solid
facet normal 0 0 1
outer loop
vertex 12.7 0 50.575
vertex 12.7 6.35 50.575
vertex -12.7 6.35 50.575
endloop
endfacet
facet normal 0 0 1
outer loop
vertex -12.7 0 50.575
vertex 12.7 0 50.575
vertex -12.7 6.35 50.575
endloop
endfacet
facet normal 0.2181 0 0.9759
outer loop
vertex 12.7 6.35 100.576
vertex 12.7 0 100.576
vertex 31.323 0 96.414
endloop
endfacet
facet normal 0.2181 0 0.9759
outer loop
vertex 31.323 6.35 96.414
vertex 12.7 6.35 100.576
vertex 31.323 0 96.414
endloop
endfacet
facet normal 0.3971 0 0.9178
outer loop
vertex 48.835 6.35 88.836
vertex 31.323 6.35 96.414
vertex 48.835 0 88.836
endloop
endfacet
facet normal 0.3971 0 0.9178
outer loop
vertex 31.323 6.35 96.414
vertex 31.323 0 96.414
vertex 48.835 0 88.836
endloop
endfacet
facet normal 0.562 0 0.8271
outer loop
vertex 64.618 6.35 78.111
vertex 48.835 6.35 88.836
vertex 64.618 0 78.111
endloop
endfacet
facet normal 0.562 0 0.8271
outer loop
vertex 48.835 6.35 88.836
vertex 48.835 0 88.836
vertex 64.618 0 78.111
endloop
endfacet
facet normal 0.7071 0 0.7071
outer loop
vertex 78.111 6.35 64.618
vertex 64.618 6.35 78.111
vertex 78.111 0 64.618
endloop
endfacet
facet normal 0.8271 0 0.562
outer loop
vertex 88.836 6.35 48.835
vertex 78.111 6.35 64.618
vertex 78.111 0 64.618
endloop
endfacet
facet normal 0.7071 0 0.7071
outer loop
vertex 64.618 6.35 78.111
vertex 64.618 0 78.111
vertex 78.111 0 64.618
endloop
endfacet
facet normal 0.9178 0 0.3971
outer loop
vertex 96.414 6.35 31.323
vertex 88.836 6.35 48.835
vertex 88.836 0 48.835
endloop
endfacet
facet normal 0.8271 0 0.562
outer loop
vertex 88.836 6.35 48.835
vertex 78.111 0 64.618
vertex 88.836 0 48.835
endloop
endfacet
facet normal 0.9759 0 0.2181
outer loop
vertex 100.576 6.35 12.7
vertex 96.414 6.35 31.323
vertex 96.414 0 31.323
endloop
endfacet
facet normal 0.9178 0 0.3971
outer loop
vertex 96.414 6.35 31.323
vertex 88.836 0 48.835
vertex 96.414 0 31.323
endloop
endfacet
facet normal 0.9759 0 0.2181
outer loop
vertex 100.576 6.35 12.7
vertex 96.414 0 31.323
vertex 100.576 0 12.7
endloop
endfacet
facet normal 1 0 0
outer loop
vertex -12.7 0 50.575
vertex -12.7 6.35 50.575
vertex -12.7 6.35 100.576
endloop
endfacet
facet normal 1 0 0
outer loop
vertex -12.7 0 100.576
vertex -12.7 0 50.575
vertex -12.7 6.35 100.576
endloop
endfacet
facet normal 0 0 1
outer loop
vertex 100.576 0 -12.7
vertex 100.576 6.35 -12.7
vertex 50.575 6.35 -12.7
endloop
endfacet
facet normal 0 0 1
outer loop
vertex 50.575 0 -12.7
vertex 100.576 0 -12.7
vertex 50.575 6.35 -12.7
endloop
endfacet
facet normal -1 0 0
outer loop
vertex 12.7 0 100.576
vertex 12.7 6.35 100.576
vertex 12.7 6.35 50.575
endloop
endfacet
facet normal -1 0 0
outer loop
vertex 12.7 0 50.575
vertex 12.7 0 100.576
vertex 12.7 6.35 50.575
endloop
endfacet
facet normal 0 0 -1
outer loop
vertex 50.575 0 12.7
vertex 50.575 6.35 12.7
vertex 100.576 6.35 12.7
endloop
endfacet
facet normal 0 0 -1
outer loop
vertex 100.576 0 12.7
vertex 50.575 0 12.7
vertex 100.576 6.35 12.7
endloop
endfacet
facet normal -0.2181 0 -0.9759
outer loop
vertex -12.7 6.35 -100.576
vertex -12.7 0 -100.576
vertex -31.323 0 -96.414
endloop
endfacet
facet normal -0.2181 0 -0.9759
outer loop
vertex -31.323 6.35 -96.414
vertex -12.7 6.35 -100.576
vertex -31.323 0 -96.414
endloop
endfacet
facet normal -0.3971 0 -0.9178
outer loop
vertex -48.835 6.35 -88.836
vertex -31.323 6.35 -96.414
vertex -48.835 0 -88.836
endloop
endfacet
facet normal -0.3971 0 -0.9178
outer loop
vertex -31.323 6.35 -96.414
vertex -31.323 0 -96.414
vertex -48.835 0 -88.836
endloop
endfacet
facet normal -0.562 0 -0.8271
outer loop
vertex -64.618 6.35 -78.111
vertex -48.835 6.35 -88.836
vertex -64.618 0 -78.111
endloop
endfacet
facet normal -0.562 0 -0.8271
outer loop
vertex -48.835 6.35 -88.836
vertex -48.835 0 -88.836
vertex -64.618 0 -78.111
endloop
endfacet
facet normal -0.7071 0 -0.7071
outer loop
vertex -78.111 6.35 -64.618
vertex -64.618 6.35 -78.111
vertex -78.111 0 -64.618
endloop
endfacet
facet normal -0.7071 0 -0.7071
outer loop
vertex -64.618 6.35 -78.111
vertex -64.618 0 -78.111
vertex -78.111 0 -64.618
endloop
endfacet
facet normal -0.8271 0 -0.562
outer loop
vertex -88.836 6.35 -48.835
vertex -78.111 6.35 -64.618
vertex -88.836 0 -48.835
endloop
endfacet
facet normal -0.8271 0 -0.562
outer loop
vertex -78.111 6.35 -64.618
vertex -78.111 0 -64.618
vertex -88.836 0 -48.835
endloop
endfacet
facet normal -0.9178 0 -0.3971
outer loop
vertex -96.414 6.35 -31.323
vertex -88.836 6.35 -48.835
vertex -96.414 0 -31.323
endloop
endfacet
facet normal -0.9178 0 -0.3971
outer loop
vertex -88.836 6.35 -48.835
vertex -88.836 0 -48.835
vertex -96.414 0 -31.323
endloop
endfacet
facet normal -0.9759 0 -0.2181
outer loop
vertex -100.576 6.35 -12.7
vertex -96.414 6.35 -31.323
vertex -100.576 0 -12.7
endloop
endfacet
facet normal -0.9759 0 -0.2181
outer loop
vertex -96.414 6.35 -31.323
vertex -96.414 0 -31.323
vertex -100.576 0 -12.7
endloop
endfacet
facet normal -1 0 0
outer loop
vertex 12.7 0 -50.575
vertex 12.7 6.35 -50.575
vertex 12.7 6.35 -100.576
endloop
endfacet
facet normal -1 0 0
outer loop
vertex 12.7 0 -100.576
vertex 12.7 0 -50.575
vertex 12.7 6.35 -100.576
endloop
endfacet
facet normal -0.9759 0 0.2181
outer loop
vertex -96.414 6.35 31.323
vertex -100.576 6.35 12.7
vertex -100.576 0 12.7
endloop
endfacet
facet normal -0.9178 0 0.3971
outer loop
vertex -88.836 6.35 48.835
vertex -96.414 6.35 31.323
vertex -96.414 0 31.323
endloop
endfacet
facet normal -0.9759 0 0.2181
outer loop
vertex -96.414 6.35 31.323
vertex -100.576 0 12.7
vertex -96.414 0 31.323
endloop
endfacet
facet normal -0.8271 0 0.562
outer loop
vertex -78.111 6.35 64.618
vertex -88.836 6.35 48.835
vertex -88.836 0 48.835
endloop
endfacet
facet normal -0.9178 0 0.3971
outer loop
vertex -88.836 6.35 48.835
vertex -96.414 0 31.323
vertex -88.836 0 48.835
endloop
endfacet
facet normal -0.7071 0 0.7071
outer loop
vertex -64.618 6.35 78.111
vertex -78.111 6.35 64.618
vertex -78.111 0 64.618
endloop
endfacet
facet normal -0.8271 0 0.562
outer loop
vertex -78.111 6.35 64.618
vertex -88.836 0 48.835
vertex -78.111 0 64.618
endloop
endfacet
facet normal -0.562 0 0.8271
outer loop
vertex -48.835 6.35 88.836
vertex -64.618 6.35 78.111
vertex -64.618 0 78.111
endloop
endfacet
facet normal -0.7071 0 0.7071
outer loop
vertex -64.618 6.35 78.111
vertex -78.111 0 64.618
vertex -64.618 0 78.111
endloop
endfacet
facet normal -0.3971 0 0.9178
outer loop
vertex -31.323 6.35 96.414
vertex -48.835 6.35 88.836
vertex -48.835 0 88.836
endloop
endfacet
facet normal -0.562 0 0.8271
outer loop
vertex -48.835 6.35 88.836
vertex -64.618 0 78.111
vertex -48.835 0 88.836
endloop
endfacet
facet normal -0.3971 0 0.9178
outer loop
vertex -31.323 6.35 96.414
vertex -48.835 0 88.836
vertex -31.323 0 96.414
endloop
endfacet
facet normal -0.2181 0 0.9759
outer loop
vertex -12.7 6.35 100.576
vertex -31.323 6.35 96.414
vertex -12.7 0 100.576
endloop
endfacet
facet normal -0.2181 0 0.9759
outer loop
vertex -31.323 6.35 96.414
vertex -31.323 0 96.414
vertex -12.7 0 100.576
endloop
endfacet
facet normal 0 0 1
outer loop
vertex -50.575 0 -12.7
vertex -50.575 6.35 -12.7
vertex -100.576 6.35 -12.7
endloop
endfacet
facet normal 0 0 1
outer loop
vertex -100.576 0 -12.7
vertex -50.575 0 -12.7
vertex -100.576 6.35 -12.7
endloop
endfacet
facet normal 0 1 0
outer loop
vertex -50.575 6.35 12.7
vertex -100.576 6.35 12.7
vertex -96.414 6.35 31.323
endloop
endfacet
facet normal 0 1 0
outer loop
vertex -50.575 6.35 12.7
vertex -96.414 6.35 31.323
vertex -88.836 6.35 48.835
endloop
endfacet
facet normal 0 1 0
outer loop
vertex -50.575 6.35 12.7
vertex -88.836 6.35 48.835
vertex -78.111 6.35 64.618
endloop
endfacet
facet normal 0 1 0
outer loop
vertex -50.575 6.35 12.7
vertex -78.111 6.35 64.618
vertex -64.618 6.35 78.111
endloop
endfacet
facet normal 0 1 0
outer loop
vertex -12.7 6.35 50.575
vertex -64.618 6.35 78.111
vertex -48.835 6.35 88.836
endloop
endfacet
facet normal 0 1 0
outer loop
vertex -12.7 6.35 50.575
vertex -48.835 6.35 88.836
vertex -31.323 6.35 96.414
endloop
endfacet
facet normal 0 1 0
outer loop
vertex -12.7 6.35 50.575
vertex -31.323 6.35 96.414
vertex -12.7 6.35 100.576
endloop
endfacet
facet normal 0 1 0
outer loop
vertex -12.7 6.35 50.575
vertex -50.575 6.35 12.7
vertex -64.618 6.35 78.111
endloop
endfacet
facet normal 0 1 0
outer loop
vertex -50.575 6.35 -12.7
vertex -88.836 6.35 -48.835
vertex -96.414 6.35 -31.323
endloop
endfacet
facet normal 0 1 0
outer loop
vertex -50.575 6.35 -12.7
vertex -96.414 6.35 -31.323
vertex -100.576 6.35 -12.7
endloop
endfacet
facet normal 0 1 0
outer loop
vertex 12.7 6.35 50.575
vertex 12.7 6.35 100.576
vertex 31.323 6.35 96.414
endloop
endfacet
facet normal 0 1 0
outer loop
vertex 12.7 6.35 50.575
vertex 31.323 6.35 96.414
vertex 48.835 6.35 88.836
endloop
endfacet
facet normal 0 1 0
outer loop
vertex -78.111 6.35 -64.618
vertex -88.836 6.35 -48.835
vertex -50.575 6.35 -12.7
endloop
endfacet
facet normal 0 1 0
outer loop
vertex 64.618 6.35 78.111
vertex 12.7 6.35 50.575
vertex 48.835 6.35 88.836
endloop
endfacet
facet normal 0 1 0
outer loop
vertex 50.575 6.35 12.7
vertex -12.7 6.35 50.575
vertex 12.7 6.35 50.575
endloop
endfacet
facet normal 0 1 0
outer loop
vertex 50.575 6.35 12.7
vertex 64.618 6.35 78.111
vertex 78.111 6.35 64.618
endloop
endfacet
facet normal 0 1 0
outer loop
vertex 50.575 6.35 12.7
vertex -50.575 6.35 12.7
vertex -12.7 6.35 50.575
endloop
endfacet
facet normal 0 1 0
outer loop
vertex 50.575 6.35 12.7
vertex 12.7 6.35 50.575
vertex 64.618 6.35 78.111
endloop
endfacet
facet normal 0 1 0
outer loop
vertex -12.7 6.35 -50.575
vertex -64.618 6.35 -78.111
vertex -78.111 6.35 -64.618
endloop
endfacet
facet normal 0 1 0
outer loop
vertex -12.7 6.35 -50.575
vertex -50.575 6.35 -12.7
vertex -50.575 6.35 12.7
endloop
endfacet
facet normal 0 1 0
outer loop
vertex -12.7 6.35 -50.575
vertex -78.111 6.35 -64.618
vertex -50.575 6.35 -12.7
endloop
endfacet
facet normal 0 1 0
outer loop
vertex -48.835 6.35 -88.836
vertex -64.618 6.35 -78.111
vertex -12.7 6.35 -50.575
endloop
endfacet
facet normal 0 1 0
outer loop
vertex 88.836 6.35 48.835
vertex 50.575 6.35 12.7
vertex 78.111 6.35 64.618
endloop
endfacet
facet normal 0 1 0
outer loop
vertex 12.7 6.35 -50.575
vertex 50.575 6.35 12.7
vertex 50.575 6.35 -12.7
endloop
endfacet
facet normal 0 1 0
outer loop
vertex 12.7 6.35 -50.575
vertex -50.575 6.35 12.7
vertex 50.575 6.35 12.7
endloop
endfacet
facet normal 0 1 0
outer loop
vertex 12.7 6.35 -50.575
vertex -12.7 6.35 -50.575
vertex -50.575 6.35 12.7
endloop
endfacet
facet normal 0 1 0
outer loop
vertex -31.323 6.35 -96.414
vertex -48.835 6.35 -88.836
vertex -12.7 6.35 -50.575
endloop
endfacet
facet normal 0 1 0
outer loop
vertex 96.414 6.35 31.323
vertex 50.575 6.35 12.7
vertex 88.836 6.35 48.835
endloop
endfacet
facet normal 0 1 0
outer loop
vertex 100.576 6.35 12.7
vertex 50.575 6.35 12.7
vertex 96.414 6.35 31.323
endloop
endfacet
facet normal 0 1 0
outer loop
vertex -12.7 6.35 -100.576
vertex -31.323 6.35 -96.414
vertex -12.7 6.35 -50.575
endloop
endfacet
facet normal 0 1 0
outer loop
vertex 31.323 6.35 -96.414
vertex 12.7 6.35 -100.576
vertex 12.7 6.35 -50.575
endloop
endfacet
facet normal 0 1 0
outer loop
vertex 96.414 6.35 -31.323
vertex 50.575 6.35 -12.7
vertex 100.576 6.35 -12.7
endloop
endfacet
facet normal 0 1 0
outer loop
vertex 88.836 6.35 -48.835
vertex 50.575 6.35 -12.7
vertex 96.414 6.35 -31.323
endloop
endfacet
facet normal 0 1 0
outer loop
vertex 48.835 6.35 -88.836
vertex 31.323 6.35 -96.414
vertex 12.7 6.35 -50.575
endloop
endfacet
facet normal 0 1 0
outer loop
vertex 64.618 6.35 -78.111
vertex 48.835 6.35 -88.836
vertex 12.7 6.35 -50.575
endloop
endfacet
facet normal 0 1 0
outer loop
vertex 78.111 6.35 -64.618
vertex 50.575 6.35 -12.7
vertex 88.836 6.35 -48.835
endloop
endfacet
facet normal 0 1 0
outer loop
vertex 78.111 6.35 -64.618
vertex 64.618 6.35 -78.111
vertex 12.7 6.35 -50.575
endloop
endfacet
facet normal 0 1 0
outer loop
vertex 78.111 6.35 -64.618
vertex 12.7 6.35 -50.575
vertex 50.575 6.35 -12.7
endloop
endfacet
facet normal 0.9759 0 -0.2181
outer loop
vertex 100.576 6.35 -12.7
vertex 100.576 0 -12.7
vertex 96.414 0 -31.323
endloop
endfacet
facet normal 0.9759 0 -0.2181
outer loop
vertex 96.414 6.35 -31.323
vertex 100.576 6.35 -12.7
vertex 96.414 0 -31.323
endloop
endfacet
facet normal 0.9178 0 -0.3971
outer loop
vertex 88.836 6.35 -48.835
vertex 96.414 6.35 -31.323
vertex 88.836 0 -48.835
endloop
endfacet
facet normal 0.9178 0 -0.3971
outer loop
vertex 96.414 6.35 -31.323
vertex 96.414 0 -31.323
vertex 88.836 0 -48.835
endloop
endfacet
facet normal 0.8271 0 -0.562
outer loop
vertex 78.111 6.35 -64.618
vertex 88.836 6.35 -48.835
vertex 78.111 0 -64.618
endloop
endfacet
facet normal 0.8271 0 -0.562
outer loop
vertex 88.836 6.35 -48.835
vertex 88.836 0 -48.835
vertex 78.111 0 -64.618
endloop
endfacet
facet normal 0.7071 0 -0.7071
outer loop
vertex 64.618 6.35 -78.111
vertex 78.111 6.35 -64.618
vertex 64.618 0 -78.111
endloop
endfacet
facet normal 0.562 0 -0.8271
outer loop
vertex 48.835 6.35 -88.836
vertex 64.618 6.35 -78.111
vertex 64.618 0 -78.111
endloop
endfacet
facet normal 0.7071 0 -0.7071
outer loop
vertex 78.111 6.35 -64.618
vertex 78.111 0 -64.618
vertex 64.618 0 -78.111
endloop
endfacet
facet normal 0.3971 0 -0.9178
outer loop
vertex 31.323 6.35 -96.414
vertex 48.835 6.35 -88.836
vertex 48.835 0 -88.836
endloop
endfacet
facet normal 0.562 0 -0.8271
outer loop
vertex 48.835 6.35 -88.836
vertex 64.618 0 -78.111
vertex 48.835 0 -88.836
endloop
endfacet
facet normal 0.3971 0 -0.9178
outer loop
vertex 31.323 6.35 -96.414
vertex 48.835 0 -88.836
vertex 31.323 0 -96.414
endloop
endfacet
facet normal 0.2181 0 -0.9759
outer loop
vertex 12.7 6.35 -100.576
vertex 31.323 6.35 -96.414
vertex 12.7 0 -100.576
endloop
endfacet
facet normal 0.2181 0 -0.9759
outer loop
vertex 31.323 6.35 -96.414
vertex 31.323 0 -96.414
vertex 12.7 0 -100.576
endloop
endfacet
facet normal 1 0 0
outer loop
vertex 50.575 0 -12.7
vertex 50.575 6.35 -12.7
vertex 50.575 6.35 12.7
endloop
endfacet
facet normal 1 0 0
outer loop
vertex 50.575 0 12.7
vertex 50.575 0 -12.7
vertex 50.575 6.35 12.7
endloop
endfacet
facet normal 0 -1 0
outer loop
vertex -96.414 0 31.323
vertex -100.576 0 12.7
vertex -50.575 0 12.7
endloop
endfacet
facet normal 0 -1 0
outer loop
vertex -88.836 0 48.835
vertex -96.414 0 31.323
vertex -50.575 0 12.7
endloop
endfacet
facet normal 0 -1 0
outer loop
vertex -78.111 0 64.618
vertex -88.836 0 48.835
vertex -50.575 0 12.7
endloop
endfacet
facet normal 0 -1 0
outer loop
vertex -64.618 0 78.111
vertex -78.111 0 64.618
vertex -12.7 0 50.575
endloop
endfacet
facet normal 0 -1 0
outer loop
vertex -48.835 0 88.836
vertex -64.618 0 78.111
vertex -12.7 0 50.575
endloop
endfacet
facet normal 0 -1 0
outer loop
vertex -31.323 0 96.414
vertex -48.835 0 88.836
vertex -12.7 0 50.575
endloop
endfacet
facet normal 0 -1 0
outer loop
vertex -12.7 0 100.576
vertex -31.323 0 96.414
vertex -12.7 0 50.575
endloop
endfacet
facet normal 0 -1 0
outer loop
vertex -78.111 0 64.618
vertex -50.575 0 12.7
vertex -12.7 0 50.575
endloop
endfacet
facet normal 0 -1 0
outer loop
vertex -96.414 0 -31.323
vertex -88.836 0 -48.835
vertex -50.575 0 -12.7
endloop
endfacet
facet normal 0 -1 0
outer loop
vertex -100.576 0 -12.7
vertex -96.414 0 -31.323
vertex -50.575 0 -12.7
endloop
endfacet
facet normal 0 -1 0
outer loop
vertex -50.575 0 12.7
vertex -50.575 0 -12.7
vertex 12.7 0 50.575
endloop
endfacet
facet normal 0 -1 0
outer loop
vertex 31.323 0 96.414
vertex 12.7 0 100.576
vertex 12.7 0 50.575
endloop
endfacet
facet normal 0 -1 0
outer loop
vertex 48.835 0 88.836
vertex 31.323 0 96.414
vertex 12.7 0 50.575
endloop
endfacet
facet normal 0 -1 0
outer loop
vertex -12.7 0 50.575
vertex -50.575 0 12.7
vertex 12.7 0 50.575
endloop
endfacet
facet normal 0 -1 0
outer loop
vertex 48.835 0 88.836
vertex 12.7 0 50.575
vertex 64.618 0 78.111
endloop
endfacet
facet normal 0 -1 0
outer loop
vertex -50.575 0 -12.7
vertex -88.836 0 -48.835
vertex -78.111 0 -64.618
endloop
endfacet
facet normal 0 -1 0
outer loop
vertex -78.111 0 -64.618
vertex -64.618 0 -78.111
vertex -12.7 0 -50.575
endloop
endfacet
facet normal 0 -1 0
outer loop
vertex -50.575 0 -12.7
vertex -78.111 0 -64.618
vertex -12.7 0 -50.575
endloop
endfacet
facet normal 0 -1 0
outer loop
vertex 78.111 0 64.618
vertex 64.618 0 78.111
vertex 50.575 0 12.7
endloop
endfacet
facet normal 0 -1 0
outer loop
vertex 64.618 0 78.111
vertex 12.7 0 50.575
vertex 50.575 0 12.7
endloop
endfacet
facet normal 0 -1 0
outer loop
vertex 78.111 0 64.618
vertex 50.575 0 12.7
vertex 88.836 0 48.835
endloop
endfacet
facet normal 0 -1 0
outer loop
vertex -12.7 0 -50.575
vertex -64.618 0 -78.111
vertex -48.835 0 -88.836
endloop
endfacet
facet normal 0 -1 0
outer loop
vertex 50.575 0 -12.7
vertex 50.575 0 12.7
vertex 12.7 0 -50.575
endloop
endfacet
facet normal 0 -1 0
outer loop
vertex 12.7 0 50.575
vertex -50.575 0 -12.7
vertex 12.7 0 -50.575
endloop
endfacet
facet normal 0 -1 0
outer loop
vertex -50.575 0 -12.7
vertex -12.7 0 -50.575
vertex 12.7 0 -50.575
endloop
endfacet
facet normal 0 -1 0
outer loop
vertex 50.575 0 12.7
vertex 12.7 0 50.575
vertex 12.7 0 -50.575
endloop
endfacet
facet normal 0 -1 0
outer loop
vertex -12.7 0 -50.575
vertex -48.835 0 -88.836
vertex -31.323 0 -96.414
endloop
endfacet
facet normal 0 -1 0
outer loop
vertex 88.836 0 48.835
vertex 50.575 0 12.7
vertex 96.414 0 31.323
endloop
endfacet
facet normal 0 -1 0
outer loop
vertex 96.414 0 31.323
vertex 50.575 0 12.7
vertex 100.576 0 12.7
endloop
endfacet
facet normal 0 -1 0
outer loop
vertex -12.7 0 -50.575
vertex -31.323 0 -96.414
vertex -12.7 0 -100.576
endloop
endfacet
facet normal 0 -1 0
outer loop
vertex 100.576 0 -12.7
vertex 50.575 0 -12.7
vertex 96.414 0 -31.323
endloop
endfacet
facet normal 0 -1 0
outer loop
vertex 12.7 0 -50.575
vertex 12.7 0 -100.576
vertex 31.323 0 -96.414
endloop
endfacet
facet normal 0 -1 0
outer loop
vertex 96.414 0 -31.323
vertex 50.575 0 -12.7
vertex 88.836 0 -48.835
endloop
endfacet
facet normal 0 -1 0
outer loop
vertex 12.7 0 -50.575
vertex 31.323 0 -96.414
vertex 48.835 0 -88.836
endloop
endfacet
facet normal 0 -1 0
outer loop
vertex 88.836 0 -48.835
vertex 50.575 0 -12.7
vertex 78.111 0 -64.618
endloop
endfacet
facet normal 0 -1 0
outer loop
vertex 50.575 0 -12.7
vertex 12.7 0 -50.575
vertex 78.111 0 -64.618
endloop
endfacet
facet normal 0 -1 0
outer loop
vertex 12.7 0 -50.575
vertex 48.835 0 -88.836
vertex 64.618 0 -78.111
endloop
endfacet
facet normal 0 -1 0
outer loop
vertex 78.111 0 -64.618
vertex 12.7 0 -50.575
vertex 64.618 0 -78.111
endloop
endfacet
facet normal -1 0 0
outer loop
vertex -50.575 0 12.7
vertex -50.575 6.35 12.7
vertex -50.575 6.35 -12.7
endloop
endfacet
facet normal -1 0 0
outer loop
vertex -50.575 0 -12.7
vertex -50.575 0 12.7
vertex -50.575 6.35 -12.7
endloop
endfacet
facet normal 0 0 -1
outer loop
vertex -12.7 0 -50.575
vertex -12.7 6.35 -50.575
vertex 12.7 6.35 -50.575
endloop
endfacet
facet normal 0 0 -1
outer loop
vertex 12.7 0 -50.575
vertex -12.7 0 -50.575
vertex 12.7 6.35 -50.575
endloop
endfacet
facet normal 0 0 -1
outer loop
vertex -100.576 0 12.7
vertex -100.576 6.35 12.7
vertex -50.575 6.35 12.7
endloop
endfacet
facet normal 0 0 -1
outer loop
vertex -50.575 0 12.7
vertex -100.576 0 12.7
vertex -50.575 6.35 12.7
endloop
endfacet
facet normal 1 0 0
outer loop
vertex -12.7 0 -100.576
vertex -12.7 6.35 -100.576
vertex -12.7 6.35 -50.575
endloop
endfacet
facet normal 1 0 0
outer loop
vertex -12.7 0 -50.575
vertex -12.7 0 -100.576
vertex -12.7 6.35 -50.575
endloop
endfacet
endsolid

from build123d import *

# Parameters (mm, degrees)
SKETCH1_R           = 101.374642805
BOSS_EXTRUDE1_DEPTH = 6.35
CUT_EXTRUDE1_DEPTH  = 7.35


with BuildPart() as part:
    # Sketch1 → Boss-Extrude1 (new body)
    with BuildSketch(Plane(origin=(0, 0, 0), x_dir=(1, 0, 0), z_dir=(0, 1, 0))):
        Circle(SKETCH1_R)
    extrude(amount=BOSS_EXTRUDE1_DEPTH)

    # Sketch2 → Cut-Extrude1 (cut, through all)
    with BuildSketch(Plane(origin=(0, 6.35, 0), x_dir=(1, 0, 0), z_dir=(0, 1, 0))):
        with BuildLine():
            ThreePointArc((-101.374642805, 1.78e-07), (-101.174780653, -6.362543795), (-100.575982241, -12.7))
            Line((-100.575982241, -12.7), (-57.078868275, -12.7))
            Line((-57.078868275, -12.7), (-50.574642805, -12.7))
            Line((-50.574642805, -12.7), (-50.574642805, 12.7))
            Line((-50.574642805, 12.7), (-100.575982241, 12.7))
            ThreePointArc((-100.575982241, 12.7), (-101.174780642, 6.362543972), (-101.374642805, 1.78e-07))
        make_face()
        with BuildLine():
            ThreePointArc((2.49e-07, 101.374642805), (-6.36254376, 101.174780655), (-12.7, 100.575982241))
            Line((-12.7, 100.575982241), (-12.7, 57.078868275))
            Line((-12.7, 57.078868275), (-12.7, 50.574642805))
            Line((-12.7, 50.574642805), (12.7, 50.574642805))
            Line((12.7, 50.574642805), (12.7, 100.575982241))
            ThreePointArc((12.7, 100.575982241), (6.362544008, 101.17478064), (2.49e-07, 101.374642805))
        make_face()
        with BuildLine():
            Line((50.574642805, -12.7), (100.575982241, -12.7))
            ThreePointArc((100.575982241, -12.7), (101.174780648, -6.362543884), (101.374642805, 0))
            ThreePointArc((101.374642805, 0), (101.174780648, 6.362543884), (100.575982241, 12.7))
            Line((100.575982241, 12.7), (57.078868275, 12.7))
            Line((57.078868275, 12.7), (50.574642805, 12.7))
            Line((50.574642805, 12.7), (50.574642805, -12.7))
        make_face()
        with BuildLine():
            Line((12.7, -50.574642805), (-12.7, -50.574642805))
            Line((-12.7, -50.574642805), (-12.7, -100.575982241))
            ThreePointArc((-12.7, -100.575982241), (-6.362543952, -101.174780643), (-1.37e-07, -101.374642805))
            ThreePointArc((-1.37e-07, -101.374642805), (6.362543815, -101.174780652), (12.7, -100.575982241))
            Line((12.7, -100.575982241), (12.7, -57.078868275))
            Line((12.7, -57.078868275), (12.7, -50.574642805))
        make_face()
    extrude(amount=-CUT_EXTRUDE1_DEPTH, mode=Mode.SUBTRACT)


solid = part.part
